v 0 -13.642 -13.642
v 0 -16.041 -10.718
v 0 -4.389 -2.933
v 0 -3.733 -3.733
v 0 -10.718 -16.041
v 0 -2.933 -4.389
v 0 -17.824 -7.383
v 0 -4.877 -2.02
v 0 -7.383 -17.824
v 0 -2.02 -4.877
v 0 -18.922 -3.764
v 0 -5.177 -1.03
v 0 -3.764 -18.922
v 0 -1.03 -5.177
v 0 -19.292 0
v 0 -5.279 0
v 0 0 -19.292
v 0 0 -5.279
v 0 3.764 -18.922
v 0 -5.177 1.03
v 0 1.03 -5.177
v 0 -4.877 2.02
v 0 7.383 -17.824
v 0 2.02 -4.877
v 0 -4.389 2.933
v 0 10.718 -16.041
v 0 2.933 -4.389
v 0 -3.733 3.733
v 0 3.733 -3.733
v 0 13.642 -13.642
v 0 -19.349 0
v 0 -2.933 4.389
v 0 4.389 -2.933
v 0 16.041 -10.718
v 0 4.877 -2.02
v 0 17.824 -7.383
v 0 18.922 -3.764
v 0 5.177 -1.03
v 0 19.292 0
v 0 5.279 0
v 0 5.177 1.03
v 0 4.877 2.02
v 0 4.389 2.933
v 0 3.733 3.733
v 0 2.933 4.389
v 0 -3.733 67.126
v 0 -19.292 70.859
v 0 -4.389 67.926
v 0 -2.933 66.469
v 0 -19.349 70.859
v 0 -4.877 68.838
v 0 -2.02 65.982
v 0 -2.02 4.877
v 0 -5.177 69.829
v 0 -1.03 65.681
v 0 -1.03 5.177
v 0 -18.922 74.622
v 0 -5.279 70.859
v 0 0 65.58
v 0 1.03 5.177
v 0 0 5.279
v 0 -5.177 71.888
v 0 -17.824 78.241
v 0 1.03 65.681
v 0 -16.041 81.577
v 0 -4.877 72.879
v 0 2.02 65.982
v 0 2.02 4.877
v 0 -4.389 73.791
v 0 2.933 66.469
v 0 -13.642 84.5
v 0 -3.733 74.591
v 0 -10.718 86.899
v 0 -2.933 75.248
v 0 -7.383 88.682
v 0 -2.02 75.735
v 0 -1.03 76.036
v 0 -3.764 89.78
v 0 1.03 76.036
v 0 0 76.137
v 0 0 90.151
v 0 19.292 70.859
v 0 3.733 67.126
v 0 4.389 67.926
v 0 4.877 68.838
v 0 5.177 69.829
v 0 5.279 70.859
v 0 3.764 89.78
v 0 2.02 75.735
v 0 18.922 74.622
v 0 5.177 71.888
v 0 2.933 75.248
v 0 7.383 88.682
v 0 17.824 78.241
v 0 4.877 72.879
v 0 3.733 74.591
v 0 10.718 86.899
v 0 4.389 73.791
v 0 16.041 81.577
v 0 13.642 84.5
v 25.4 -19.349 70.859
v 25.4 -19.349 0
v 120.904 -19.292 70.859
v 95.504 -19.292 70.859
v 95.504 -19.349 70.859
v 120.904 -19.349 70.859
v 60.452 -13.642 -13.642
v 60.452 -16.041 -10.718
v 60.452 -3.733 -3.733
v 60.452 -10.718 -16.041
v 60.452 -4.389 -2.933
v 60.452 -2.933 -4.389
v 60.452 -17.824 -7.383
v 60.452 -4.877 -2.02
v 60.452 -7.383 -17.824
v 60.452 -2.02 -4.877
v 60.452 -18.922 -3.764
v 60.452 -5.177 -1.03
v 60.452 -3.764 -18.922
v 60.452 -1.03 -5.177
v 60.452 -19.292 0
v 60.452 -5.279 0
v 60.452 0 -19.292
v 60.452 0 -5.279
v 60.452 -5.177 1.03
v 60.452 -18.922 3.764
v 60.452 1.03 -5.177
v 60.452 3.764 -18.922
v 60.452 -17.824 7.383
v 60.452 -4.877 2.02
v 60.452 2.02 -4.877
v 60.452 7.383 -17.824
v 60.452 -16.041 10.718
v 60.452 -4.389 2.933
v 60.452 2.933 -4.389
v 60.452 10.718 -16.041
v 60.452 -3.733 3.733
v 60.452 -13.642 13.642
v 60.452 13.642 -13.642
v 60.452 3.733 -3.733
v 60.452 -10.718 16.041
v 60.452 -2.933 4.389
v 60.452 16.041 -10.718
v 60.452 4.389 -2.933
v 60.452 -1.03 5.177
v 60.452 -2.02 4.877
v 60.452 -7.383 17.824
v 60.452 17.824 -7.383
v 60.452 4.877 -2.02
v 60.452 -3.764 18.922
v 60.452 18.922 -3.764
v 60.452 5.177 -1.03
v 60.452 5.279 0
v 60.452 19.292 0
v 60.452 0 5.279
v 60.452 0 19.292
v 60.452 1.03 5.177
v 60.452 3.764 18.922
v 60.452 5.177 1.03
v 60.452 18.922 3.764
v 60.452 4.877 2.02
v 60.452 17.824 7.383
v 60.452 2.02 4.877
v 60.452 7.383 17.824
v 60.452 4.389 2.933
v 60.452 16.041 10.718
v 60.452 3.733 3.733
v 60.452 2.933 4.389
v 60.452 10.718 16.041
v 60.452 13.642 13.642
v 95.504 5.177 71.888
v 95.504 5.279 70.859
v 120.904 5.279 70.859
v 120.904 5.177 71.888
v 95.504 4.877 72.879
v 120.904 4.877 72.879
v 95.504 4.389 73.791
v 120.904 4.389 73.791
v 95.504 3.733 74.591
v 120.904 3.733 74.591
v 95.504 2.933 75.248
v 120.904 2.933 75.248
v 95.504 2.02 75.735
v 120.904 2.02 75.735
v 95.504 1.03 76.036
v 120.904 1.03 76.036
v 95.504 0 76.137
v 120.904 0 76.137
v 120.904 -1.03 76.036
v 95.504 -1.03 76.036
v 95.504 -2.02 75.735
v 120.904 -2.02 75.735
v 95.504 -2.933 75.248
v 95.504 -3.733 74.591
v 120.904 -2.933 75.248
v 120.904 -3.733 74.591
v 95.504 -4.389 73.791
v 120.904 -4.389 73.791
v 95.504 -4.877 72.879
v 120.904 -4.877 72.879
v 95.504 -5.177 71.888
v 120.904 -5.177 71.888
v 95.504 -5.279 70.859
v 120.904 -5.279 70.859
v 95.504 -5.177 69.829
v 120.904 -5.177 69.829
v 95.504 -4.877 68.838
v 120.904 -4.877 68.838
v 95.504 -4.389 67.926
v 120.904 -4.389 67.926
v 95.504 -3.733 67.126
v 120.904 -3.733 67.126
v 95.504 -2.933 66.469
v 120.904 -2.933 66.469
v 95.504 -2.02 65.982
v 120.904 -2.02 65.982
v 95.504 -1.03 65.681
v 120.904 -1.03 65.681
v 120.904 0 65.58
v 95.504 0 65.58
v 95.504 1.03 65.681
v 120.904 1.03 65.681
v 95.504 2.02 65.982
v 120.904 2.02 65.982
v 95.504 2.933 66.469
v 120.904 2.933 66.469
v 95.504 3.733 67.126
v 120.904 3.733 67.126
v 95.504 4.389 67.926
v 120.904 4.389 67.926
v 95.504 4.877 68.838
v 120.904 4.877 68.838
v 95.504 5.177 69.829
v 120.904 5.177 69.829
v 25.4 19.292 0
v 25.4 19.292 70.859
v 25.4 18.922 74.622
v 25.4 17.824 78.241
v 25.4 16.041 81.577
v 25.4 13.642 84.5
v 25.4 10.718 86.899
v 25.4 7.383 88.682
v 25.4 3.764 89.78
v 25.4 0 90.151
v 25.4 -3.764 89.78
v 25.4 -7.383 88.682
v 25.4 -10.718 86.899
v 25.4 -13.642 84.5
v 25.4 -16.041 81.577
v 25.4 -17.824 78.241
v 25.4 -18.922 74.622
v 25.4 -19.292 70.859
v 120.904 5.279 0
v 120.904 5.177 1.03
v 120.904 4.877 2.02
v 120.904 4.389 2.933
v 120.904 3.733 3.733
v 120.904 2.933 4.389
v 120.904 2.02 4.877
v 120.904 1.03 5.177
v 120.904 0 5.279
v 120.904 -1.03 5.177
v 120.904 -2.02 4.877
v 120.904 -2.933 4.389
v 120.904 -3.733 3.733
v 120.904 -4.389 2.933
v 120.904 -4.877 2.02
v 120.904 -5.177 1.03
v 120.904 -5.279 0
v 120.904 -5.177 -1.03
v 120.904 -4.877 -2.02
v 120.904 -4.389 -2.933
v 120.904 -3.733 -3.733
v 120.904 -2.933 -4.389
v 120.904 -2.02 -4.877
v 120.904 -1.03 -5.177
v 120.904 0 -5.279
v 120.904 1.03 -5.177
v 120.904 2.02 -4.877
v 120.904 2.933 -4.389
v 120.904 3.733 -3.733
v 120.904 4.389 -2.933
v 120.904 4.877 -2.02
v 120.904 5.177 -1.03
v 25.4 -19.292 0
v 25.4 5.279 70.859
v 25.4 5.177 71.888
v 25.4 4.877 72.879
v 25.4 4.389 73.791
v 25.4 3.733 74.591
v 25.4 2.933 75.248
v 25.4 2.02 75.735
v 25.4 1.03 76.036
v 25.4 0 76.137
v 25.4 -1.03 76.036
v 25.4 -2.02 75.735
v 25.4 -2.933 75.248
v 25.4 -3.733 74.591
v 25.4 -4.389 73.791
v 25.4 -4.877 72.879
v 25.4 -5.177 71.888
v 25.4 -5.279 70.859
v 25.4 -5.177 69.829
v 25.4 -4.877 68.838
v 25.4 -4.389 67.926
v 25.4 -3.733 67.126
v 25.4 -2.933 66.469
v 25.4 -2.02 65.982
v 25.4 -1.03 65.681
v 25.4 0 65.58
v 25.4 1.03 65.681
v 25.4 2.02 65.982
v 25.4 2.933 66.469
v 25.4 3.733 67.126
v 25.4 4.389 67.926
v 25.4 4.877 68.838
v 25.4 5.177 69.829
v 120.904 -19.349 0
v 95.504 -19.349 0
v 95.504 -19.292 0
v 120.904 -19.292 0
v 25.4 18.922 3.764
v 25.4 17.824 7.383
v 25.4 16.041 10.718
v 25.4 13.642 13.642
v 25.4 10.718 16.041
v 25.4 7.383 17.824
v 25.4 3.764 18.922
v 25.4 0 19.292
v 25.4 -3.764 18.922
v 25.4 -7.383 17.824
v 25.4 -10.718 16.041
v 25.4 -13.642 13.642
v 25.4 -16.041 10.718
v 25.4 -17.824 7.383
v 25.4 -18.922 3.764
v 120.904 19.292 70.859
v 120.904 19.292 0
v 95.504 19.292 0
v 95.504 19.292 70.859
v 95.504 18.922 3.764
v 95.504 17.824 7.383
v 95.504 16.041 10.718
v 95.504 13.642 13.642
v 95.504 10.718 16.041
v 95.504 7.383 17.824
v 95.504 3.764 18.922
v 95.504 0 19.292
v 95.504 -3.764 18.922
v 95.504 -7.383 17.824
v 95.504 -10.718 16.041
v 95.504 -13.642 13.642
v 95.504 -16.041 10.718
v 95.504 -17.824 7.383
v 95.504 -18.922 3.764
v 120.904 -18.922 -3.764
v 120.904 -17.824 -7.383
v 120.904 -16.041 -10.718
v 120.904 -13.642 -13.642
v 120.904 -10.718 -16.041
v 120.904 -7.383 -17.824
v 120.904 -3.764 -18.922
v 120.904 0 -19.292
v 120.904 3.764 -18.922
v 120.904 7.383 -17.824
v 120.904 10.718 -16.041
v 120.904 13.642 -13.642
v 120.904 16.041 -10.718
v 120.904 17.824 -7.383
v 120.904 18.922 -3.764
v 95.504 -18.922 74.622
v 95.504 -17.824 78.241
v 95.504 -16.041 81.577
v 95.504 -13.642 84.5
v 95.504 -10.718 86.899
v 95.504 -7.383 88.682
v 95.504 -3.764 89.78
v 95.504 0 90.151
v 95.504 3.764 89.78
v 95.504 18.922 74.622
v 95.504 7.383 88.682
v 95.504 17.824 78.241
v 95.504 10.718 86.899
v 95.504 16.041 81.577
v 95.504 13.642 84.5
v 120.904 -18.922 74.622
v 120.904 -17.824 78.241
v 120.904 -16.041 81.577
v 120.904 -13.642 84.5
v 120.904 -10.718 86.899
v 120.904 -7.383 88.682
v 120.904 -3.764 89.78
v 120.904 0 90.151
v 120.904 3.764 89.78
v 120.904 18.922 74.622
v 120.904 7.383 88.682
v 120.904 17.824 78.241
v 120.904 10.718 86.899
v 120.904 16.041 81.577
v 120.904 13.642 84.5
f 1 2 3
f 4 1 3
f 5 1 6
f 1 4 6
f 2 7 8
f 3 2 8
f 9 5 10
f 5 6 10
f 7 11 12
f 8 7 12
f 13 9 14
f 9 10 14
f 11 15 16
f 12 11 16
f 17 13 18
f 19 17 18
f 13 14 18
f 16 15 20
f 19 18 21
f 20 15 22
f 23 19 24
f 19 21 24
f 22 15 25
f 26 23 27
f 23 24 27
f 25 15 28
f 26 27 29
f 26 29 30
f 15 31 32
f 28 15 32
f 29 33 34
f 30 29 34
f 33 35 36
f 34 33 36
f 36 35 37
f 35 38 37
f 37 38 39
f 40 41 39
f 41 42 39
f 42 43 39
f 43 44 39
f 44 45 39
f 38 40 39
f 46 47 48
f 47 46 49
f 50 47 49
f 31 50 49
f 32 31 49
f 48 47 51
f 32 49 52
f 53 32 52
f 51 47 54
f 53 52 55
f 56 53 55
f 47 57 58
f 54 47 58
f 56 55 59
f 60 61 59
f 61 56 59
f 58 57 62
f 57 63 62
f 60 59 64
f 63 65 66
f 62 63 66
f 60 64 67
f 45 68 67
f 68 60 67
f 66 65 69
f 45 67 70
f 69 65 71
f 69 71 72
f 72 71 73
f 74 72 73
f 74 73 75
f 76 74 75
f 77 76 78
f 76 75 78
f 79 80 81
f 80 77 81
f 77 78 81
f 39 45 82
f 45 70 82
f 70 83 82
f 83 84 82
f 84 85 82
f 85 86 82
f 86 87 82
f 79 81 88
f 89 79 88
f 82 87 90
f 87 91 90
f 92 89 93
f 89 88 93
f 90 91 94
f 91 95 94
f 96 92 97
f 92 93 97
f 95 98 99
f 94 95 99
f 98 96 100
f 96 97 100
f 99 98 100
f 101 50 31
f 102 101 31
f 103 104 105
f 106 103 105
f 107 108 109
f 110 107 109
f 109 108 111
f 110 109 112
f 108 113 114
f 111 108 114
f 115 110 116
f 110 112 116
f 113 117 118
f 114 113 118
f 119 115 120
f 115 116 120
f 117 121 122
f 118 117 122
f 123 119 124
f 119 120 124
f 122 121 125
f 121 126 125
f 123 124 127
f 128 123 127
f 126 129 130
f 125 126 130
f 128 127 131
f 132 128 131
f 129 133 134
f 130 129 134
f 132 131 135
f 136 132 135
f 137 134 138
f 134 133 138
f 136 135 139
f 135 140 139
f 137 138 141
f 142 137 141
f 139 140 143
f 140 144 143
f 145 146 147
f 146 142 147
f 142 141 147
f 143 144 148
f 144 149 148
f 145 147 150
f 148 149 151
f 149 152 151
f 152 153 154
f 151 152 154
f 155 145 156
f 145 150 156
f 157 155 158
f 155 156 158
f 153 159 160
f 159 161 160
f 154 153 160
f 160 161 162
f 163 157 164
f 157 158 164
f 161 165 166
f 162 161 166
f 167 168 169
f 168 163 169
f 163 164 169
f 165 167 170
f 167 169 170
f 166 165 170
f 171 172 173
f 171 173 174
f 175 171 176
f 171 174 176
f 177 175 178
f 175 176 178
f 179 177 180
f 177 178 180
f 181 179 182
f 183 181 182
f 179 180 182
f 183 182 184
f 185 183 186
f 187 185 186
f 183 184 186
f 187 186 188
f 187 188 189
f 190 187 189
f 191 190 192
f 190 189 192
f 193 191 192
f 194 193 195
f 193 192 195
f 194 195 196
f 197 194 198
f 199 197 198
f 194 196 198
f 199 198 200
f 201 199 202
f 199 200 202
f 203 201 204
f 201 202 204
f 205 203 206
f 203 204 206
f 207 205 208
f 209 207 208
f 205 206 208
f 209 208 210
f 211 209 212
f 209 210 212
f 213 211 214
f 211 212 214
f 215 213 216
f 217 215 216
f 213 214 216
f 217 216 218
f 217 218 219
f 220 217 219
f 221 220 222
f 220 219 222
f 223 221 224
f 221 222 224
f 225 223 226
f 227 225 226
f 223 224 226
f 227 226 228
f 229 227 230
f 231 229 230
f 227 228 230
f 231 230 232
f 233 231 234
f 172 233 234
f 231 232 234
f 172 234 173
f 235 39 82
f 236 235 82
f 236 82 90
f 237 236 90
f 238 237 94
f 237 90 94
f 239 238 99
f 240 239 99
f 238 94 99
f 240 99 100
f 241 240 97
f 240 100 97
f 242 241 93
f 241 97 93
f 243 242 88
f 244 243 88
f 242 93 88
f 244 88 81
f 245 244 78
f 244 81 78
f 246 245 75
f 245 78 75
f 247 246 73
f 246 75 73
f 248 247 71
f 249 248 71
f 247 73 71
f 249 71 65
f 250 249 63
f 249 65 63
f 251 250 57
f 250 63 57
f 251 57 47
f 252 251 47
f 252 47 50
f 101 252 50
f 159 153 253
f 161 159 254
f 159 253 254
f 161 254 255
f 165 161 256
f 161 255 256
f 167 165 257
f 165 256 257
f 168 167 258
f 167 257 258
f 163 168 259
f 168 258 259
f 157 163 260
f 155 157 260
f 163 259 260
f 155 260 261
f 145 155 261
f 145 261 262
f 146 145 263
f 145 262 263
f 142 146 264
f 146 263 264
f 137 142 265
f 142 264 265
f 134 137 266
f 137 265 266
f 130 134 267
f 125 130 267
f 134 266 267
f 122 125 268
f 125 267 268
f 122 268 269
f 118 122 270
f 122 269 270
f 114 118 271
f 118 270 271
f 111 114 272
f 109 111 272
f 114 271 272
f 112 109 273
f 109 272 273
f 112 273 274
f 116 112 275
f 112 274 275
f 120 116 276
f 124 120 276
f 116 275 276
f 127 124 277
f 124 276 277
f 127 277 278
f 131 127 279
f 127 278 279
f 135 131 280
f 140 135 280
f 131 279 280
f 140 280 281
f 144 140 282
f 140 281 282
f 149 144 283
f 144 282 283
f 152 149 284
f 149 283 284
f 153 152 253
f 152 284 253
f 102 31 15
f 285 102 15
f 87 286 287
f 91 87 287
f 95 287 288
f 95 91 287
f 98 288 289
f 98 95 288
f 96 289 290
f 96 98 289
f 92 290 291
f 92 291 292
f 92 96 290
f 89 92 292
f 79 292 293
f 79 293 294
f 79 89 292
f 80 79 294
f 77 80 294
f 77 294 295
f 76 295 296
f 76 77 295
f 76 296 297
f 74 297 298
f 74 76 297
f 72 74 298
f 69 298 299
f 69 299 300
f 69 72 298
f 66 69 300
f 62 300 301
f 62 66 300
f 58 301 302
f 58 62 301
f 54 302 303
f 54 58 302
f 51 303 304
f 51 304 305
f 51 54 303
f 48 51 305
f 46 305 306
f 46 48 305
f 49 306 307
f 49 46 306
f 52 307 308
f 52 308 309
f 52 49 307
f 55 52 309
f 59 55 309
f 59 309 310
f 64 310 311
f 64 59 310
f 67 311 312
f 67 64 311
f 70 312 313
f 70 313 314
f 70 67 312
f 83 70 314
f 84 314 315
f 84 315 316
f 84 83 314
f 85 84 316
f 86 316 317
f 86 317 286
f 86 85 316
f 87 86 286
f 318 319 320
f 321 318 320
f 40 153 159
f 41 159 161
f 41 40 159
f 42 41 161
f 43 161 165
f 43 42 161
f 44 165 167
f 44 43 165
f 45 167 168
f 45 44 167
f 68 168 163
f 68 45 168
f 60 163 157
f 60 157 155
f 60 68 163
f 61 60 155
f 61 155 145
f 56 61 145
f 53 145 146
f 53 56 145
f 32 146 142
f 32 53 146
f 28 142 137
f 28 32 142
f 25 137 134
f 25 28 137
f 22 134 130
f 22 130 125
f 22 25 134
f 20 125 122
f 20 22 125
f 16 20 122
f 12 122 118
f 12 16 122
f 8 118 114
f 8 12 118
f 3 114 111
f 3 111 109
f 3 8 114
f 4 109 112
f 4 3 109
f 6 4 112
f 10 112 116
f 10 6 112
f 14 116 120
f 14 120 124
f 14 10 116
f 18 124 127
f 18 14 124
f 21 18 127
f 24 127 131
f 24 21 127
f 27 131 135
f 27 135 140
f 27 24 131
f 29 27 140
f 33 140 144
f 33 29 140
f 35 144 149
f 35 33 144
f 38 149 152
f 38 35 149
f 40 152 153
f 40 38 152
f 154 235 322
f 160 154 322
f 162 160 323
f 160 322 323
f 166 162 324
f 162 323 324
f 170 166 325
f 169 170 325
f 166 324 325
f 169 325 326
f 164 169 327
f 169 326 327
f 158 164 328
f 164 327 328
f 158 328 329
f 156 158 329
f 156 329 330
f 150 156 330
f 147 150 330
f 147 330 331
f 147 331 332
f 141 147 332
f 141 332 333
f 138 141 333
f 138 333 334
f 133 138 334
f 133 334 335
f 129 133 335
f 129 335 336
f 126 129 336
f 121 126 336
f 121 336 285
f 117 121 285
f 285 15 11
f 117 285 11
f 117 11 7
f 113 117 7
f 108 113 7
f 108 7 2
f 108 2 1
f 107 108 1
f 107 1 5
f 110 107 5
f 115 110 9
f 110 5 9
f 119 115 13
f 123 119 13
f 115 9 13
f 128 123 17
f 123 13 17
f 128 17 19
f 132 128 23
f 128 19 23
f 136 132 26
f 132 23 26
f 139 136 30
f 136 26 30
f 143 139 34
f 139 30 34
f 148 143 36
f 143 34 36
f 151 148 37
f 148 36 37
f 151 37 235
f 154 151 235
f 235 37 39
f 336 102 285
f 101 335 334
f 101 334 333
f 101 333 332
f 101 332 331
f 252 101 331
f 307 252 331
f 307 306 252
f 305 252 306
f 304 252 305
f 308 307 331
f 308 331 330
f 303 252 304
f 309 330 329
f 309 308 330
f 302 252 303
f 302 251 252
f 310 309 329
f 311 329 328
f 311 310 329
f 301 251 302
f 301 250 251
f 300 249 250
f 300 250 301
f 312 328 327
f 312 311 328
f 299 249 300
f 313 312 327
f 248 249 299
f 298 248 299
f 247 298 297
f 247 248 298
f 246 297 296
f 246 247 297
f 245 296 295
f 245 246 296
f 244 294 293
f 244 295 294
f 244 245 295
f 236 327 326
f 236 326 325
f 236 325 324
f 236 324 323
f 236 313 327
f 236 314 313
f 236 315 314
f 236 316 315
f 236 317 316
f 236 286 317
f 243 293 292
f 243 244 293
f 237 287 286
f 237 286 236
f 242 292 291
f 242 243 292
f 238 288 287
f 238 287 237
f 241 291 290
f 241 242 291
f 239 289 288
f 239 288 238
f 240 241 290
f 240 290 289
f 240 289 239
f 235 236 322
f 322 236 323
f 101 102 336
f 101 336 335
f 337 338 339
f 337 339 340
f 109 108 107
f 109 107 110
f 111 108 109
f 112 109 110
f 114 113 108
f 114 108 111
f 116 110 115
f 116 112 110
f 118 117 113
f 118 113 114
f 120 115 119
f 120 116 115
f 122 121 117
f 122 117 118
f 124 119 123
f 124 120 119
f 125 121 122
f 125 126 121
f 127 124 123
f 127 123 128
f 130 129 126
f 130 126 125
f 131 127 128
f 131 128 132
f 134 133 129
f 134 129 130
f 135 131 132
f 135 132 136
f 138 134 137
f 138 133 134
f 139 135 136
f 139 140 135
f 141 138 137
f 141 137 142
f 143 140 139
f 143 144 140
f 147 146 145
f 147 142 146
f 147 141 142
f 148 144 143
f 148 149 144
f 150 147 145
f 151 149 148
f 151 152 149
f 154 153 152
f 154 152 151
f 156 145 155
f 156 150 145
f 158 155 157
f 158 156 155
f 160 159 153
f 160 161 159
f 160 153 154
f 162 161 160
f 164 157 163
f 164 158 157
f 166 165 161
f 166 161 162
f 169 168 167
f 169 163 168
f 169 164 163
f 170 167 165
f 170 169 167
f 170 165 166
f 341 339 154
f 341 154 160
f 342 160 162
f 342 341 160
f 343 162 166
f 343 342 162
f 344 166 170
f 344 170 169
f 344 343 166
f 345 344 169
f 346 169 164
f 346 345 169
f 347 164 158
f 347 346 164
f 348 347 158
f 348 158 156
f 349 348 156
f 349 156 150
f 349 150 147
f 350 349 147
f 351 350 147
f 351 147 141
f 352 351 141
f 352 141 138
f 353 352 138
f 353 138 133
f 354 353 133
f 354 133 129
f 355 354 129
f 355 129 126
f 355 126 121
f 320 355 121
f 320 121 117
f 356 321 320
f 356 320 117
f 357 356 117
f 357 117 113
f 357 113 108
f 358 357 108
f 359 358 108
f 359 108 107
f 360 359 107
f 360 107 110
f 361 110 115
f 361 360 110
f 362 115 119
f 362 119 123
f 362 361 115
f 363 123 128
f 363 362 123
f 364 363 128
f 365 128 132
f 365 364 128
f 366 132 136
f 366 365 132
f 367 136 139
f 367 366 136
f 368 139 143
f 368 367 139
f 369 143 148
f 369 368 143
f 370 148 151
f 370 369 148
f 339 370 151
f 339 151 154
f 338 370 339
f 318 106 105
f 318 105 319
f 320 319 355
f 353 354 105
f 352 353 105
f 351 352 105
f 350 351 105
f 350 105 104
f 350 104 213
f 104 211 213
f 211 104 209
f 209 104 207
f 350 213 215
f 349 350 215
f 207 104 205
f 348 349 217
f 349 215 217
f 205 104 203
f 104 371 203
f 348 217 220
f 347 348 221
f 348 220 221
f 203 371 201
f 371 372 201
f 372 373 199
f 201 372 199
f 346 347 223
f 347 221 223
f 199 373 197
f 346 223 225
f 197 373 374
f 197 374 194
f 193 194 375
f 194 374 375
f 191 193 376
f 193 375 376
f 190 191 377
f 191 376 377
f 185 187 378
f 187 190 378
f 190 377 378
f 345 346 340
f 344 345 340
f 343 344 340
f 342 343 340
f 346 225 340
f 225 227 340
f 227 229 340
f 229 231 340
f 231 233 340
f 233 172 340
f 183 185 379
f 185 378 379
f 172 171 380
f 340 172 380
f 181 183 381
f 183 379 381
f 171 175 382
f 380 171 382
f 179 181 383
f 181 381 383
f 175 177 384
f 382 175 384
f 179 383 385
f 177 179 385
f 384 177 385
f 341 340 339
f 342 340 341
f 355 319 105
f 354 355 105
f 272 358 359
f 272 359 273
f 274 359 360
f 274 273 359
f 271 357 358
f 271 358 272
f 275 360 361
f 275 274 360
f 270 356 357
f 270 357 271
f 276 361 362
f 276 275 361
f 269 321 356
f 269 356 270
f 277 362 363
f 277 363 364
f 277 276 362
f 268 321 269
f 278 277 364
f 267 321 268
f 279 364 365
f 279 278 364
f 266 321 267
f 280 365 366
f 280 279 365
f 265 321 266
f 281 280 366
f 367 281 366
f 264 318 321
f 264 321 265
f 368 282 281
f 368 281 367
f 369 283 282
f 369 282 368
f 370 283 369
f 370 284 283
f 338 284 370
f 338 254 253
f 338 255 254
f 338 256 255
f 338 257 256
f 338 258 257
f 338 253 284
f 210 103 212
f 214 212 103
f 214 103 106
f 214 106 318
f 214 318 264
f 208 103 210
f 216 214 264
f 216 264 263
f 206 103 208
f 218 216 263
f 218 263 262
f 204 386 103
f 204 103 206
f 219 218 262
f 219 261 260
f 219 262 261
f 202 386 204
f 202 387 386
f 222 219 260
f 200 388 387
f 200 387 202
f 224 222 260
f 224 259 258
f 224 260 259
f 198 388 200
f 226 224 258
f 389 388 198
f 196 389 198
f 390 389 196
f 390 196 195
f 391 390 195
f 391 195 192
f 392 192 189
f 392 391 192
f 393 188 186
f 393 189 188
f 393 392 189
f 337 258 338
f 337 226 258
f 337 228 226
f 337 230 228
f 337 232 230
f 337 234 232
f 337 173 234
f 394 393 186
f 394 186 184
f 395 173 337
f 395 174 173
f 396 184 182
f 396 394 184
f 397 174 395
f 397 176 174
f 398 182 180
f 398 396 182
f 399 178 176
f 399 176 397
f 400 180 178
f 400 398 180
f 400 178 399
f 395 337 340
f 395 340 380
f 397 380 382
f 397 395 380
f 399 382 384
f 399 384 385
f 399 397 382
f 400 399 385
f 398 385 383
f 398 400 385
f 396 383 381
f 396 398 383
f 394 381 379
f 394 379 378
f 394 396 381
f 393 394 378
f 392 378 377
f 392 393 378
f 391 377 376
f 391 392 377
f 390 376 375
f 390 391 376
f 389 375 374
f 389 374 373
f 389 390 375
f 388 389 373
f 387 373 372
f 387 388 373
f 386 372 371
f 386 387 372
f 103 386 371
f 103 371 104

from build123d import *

# Parameters (mm, degrees)
F0_R     = 5.278716
F1_DEPTH = 25.4
F2_DEPTH = 60.452


with BuildPart() as f1:
    # F0 (on Right) → F1 (new body)
    with BuildSketch(Plane.YZ):
        with BuildLine():
            ThreePointArc((-19.292207, 0), (0, 19.292207), (19.292207, 0))
            Line((19.292207, 0), (19.292207, 70.858531))
            ThreePointArc((19.292207, 70.858531), (0, 51.566324), (-19.292207, 70.858531))
            Line((-19.292207, 70.858531), (-19.348826, 70.858531))
            Line((-19.348826, 70.858531), (-19.348826, 0))
            Line((-19.348826, 0), (-19.292207, 0))
        make_face()
        with BuildLine():
            ThreePointArc((-19.292207, 70.858531), (0, 51.566324), (19.292207, 70.858531))
            ThreePointArc((19.292207, 70.858531), (0, 90.150737), (-19.292207, 70.858531))
        make_face()
        with Locations((0, 70.858531)):
            Circle(F0_R, mode=Mode.SUBTRACT)
    extrude(amount=F1_DEPTH)

    # F0 (on Right) → F2 (join)
    with BuildSketch(Plane.YZ):
        with BuildLine():
            ThreePointArc((-19.292207, 0), (0, -19.292207), (19.292207, 0))
            ThreePointArc((19.292207, 0), (0, 19.292207), (-19.292207, 0))
        make_face()
        Circle(F0_R, mode=Mode.SUBTRACT)
    extrude(amount=F2_DEPTH)


with BuildPart() as f3_1:
    # F3: instance of F1
    add(f1.part.mirror(Plane.YZ.offset(60.452)))


solid = Compound([f1.part, f3_1.part])
